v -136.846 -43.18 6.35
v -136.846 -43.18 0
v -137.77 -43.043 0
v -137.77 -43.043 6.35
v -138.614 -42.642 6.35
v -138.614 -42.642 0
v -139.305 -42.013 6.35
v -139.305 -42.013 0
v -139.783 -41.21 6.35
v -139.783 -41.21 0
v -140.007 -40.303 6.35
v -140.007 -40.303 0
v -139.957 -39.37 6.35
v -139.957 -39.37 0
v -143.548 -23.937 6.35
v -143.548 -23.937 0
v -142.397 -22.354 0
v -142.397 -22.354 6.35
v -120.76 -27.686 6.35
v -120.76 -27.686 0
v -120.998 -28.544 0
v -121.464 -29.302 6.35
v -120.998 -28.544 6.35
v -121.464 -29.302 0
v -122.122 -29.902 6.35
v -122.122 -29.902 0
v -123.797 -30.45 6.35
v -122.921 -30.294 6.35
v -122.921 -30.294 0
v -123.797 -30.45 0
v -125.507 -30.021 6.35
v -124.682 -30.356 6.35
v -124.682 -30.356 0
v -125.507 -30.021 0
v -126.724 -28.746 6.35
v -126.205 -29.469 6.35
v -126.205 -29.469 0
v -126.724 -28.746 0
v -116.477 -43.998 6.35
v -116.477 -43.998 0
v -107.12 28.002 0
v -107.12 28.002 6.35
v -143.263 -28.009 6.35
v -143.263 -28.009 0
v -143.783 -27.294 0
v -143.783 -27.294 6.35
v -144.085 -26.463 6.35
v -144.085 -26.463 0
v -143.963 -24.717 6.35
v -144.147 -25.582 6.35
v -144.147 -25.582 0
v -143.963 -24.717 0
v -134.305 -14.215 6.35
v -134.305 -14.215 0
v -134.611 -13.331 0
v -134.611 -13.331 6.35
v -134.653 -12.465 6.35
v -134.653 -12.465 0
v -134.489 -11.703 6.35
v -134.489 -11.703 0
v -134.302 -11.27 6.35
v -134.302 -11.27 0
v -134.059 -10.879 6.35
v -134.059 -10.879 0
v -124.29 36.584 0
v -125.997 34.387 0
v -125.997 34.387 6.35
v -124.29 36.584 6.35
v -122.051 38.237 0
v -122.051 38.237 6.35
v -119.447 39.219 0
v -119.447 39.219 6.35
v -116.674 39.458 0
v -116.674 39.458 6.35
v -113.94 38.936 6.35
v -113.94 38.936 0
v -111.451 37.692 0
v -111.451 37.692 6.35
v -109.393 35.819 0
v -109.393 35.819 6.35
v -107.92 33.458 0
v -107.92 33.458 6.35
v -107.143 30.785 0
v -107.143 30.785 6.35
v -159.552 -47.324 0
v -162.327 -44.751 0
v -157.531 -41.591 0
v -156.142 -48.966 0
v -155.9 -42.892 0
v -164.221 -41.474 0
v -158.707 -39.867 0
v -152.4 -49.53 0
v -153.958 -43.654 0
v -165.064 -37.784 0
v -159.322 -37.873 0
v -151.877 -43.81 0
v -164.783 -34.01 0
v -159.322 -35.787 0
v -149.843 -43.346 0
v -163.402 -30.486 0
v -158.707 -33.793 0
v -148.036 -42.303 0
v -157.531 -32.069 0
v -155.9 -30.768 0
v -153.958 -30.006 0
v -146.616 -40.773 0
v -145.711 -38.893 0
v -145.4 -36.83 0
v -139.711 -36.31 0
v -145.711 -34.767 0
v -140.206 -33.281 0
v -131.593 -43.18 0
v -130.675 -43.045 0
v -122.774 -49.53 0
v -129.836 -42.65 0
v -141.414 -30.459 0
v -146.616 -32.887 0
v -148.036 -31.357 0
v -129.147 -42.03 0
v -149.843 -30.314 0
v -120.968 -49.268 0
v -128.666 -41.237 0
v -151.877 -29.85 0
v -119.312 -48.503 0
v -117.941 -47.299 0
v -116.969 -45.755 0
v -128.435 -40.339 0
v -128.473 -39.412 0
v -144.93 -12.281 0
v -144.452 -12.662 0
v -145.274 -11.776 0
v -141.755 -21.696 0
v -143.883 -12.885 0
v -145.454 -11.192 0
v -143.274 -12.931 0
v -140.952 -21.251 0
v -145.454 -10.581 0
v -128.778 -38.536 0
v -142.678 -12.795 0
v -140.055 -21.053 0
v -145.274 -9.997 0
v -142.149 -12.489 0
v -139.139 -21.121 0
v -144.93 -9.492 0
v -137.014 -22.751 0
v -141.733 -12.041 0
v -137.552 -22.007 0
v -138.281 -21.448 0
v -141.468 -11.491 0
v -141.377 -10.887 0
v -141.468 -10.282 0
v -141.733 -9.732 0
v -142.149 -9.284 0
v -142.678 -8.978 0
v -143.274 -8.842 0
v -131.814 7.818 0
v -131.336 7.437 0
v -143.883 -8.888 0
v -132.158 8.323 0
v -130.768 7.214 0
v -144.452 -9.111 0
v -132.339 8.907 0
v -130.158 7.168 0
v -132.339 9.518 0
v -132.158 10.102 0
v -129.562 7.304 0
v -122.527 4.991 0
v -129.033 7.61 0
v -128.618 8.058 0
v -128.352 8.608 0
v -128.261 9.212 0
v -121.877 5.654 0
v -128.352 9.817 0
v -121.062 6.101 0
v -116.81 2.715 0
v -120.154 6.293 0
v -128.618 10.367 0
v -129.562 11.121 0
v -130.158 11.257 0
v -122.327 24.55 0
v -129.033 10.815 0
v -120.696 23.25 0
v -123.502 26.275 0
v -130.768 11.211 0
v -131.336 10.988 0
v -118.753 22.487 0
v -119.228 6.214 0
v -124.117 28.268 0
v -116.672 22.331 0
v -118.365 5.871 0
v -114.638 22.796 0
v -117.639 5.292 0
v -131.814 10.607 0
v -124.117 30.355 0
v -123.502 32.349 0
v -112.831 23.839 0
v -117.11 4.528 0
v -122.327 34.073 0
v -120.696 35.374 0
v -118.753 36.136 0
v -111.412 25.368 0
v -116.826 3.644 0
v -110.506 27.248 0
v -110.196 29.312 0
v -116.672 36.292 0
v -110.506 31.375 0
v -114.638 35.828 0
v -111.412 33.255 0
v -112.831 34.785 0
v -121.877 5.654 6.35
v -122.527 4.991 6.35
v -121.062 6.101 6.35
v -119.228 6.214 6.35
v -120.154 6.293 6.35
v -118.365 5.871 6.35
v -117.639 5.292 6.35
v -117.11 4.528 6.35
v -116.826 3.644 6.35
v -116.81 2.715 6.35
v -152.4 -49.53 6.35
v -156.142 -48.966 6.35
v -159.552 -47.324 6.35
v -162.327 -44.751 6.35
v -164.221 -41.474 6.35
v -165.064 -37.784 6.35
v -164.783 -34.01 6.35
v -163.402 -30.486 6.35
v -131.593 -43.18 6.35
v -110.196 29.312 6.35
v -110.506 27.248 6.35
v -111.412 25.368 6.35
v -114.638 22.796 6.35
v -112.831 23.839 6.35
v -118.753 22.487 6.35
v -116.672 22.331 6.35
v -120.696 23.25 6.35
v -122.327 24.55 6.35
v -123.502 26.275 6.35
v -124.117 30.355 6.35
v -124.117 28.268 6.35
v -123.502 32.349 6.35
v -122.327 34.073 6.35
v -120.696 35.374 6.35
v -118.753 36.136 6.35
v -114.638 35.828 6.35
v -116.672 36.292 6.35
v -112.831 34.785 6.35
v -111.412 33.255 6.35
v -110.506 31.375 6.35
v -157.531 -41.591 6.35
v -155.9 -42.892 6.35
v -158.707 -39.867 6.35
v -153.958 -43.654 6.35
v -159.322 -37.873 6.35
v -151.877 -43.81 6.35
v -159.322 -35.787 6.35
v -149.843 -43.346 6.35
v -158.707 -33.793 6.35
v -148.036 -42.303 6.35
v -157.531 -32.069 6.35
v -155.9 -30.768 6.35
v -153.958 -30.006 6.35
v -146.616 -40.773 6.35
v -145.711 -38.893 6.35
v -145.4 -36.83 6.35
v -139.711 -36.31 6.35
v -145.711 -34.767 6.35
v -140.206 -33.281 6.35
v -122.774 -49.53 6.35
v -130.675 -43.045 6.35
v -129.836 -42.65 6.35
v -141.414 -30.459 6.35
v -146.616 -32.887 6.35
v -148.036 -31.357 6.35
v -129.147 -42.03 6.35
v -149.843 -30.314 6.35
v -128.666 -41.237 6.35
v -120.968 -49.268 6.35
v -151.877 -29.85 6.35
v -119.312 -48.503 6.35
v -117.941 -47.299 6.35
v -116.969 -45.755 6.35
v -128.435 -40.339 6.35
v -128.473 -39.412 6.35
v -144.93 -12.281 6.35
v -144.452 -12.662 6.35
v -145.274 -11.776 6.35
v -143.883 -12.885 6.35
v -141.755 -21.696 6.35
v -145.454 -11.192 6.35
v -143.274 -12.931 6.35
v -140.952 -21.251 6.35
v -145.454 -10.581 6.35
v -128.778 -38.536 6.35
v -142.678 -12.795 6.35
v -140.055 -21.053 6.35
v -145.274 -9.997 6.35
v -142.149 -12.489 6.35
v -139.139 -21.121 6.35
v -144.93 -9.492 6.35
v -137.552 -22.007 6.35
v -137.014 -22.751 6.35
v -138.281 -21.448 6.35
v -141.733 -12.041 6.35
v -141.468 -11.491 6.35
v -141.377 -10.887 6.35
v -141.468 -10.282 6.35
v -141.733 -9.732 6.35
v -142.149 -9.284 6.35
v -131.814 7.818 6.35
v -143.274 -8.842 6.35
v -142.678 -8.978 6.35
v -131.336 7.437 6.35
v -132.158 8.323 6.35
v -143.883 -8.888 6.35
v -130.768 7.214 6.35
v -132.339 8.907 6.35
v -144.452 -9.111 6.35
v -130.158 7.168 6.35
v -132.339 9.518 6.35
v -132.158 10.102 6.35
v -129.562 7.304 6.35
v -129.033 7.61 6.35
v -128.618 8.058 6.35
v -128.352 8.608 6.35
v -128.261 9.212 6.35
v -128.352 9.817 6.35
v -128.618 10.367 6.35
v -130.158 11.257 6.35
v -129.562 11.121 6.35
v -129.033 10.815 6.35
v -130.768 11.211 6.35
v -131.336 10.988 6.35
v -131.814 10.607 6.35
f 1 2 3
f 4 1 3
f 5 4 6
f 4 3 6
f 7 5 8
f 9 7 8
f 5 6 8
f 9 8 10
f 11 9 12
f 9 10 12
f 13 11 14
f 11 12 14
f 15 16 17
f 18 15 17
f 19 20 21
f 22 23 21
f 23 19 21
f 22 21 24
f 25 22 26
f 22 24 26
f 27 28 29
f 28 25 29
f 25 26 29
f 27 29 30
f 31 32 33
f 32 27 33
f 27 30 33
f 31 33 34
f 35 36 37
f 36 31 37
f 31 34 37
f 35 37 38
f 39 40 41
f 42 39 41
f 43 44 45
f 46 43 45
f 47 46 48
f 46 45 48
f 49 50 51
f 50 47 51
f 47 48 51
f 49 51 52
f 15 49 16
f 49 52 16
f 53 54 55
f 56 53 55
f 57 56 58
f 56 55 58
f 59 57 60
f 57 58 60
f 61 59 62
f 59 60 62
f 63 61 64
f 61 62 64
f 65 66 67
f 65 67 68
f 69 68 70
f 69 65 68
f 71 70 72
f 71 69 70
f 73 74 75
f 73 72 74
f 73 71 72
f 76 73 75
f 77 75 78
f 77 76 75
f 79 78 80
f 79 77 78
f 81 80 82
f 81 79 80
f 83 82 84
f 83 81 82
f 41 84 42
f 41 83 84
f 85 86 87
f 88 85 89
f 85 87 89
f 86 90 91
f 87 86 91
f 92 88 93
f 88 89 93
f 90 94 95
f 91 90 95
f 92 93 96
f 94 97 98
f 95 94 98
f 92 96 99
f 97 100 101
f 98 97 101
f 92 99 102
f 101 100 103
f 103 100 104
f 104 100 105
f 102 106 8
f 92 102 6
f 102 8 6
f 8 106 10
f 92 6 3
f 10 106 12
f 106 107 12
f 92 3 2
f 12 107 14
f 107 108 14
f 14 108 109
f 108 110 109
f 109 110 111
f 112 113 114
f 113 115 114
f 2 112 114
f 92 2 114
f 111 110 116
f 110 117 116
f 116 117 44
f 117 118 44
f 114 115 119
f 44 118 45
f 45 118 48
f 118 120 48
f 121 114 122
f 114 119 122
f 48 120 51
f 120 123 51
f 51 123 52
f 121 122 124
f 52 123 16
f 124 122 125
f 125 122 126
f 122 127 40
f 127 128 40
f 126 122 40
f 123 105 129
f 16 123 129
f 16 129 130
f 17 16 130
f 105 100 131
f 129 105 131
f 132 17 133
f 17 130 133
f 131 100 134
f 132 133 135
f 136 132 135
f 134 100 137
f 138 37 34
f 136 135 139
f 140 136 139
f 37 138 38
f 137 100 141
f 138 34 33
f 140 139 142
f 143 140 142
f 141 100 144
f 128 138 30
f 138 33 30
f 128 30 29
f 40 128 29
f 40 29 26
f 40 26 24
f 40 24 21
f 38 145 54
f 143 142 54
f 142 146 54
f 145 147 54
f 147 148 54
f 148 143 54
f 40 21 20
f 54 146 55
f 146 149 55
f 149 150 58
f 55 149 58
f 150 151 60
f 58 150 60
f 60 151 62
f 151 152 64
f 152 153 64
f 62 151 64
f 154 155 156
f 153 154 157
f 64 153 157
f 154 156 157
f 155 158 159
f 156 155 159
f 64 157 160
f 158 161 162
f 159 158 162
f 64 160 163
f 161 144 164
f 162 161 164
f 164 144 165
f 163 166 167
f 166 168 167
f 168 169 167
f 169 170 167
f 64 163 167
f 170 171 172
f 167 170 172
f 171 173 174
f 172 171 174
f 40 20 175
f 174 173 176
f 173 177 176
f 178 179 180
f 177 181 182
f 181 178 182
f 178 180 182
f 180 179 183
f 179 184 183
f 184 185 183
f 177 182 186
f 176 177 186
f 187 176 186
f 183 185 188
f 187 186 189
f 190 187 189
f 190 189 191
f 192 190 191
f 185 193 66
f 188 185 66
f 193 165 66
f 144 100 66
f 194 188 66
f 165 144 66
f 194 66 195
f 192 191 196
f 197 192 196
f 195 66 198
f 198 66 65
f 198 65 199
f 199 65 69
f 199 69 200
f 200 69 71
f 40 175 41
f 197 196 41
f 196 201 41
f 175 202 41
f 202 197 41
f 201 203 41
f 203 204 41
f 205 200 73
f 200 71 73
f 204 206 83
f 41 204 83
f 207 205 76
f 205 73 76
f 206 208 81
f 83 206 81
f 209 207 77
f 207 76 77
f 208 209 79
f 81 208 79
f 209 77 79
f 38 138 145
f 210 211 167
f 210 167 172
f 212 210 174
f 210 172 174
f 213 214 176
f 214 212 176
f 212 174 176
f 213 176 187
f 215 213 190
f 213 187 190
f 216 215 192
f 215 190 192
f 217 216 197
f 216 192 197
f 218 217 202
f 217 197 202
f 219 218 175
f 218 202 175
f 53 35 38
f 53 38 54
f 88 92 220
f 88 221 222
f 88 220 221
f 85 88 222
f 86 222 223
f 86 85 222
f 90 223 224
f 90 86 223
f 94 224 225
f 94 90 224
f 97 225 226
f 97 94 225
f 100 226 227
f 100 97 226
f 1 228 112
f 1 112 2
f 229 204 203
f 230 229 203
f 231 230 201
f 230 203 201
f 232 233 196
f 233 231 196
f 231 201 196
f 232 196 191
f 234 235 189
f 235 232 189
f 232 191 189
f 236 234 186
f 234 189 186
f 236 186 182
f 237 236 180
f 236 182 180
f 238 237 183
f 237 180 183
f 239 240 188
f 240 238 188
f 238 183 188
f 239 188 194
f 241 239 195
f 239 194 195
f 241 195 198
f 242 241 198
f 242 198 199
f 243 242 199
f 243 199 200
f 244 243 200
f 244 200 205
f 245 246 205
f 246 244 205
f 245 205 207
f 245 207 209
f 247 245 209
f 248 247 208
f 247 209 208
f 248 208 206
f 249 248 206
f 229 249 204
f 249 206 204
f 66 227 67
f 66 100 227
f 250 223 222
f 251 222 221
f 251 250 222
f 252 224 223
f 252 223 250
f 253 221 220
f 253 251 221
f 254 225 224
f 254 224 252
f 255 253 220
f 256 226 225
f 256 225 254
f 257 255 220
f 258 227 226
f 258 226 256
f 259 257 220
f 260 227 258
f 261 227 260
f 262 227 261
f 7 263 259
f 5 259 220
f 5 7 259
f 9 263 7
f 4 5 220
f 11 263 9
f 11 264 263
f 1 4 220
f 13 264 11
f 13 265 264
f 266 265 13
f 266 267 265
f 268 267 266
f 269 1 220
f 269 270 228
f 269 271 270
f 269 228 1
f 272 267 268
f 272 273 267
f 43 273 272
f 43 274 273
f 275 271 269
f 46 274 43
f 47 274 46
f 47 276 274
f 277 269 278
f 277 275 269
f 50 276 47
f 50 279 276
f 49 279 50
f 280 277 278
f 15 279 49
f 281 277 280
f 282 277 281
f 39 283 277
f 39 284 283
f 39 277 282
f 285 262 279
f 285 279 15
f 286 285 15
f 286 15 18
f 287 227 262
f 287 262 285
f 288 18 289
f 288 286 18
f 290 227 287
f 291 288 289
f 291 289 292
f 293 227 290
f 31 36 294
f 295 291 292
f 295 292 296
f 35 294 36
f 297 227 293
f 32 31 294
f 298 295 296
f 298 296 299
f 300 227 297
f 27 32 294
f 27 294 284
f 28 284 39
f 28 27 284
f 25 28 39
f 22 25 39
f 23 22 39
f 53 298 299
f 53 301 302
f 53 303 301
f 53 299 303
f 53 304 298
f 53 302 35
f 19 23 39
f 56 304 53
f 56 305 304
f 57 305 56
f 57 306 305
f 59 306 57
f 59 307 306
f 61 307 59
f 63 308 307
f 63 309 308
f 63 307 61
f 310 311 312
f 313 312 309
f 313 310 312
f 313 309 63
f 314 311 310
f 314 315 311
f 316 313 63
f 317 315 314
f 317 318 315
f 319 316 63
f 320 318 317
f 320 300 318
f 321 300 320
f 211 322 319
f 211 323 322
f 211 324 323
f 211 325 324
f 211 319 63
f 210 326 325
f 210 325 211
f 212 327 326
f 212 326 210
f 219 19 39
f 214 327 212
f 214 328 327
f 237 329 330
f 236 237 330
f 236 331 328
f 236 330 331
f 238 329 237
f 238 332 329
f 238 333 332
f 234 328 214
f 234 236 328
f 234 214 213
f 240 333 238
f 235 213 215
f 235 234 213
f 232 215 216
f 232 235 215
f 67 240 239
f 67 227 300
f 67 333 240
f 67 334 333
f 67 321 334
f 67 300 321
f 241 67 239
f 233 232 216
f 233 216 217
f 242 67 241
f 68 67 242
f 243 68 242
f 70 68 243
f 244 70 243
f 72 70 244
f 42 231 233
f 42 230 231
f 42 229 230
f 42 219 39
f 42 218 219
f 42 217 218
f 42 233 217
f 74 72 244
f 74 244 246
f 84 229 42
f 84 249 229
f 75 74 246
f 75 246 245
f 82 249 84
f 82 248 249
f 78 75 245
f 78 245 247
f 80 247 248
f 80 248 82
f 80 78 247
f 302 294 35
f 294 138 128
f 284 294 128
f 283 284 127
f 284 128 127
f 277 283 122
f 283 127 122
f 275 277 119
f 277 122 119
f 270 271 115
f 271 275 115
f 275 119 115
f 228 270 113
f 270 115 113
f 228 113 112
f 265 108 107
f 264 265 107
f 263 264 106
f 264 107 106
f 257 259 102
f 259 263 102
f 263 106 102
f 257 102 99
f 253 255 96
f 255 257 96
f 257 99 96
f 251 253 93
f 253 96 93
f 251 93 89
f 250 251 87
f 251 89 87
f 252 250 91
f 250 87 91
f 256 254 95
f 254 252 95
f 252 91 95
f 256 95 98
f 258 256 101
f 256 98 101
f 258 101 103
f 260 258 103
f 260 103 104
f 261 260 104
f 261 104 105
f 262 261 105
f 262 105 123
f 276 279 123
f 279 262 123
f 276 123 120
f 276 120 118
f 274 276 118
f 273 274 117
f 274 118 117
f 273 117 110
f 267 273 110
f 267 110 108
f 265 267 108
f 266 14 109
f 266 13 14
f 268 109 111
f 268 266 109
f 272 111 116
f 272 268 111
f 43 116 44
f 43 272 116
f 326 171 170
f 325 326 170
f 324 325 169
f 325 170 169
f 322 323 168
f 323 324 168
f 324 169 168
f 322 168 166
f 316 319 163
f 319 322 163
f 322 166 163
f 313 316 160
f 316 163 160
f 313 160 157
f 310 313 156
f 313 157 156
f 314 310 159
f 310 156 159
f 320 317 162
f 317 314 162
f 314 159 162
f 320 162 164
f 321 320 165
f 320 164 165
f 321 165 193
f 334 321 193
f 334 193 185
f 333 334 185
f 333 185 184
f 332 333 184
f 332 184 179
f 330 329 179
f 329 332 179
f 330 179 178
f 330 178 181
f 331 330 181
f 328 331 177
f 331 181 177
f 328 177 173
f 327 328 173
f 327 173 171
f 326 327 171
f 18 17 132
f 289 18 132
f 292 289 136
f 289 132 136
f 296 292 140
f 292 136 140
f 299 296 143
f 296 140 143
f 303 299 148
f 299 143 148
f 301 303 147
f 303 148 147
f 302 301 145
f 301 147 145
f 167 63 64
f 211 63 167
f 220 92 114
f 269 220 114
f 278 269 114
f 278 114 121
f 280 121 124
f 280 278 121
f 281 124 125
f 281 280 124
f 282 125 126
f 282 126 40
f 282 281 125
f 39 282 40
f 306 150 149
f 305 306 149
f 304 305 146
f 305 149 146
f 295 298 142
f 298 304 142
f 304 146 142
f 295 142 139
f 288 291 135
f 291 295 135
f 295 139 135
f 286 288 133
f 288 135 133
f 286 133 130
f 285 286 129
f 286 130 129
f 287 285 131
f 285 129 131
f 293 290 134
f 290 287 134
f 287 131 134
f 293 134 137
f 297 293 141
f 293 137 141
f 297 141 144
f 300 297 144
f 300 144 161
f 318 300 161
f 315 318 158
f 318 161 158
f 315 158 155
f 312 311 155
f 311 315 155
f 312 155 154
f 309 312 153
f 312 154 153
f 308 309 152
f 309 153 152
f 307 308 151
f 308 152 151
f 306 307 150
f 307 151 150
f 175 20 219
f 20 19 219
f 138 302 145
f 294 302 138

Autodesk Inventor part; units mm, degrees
ref_plane "YZ Plane" through (0, 0, 0) normal (1, 0, 0) x (0, 1, 0)
ref_plane "XZ Plane" through (0, 0, 0) normal (0, 1, 0) x (-1, 0, 0)
ref_plane "XY Plane" through (0, 0, 0) normal (0, 0, 1) x (1, 0, 0)
sketch "Sketch1" plane through (0, 0, 0) normal (0, 0, 1) x (1, 0, 0)
  circle A0 centre (0, 0) radius 7
  line L0 (0, 0) -> (0, -11.43) construction
  line L1 (0, -11.43) -> (-50.8, -11.43) construction
  circle A1 centre (-50.8, -11.43) radius 7
  line L2 (0, -11.43) -> (0, -24.13) construction
  line L3 (-50.8, -11.43) -> (-50.8, -24.13) construction
  line L4 (0, -24.13) -> (-101.6, -24.13) construction
  line L5 (-101.6, -24.13) -> (-101.6, -125.73) construction
  line L6 (0, -24.13) -> (12.7, -24.13) construction
  line L7 (-101.6, -125.73) -> (-35.3, -24.13) construction
  line L8 (-101.6, -125.73) -> (15.6852, -125.73) construction
  line L9 (-35.3, -24.13) -> (-117.1955, 29.3117) construction
  line L10 (-117.1955, 29.3117) -> (-143.4272, -10.8866) construction
  line L11 (-123.0577, 33.1371) -> (-149.2895, -7.0611) construction
  line L12 (-137.565, -14.712) -> (-111.3333, 25.4862) construction
  arc A2 (-111.3333, 25.4862) -> (-123.0577, 33.1371) centre (-117.1955, 29.3117) ccw construction
  arc A3 (-149.2895, -7.0611) -> (-137.565, -14.712) centre (-143.4272, -10.8866) ccw construction
  circle A4 centre (-117.1955, 29.3117) radius 12.7 construction
  circle A5 centre (0, 0) radius 120.8055 construction
  circle A6 centre (-50.8, -11.43) radius 92.6288 construction
  line L13 (-101.6, -125.73) -> (-152.4, -125.73) construction
  line L14 (-152.4, -125.73) -> (-152.4, -87.63) construction
  circle A7 centre (-152.4, -87.63) radius 38.1
  line L15 (-152.4, -87.63) -> (-152.4, -49.53) construction
  line L16 (-152.4, -49.53) -> (-152.4, -36.83) construction
  circle A8 centre (-152.4, -36.83) radius 12.7 construction
  circle A9 centre (-117.1955, 29.3117) radius 10.16
  circle A10 centre (-152.4, -36.83) radius 12.7
  line L17 (-163.4022, -30.4863) -> (-125.9972, 34.3866)
  line L18 (-152.4, -49.53) -> (-117.1955, -49.53)
  circle A11 centre (-130.3114, 9.2125) radius 2.05
  circle A12 centre (-143.4272, -10.8866) radius 2.05
  circle A13 centre (-117.1955, 29.3117) radius 7
  circle A14 centre (-152.4, -36.83) radius 7
  line L19 (-117.1955, -49.53) -> (-107.1202, 28.0024)
  point P0 (-152.4, -49.53)
  dimension "d0" = 14
  dimension "d1" = 11.43
  dimension "d2" = 50.8
  dimension "d3" = 14
  dimension "d4" = 12.7
  dimension "d5" = 12.7
  dimension "d6" = 101.6
  dimension "d7" = 101.6
  dimension "d8" = 12.7
  dimension "d9" = 48
  dimension "d14" = 97.79
  dimension "d15" = 90
  dimension "d16" = 48
  dimension "d17" = 14
  dimension "d18" = 25.4
  dimension "d19" = 50.8
  dimension "d20" = 38.1
  dimension "d21" = 12.7
  dimension "d22" = 20.32
  dimension "d24" = 4.1
  dimension "d25" = 4.1
  dimension "d26" = 14
extrude "Extrusion1" add sketch "Sketch1" along normal blind 6.35 contours A10 | A10 L17 A9 L19 L18 | A9
fillet "Fillet1" radius 6.35 1 edges at (-117.1955, -49.53, 3.175)
sketch "Sketch2" plane through (0, 0, 6.35) normal (0, 0, 1) x (1, 0, 0)
  circle A0 centre (-152.4, -36.83) radius 7 construction
  circle A1 centre (-152.4, -36.83) radius 12.7
  circle A2 centre (-117.1955, 29.3117) radius 7 construction
  circle A3 centre (-117.1955, 29.3117) radius 10.16
  line L0 (-125.9972, 34.3866) -> (-163.4022, -30.4863) construction
  arc A4 (-122.7737, -49.53) -> (-116.4767, -43.9983) centre (-122.7737, -43.18) ccw construction
  line L1 (-152.4, -49.53) -> (-122.7737, -49.53) construction
  line L2 (-116.4767, -43.9983) -> (-107.1202, 28.0024) construction
  line L3 (-122.7737, -43.18) -> (-114.631, 19.4806)
  line L4 (-122.7737, -43.18) -> (-149.4542, -43.18)
  circle A5 centre (-143.4272, -10.8866) radius 2.05 projected
  line L5 (-143.4272, -10.8866) -> (-130.3114, 7.1625) construction
  circle A6 centre (-130.3114, 9.2125) radius 2.05 projected
  line L6 (-145.2764, -26.316) -> (-115.2046, 15.0667)
  line L7 (-136.4387, 11.6152) -> (-149.5546, -6.434)
  arc A7 (-149.5546, -6.434) -> (-137.2998, -15.3392) centre (-143.4272, -10.8866) ccw
  arc A8 (-124.184, 2.7099) -> (-136.4387, 11.6152) centre (-130.3114, 7.1625) ccw
  line L8 (-122.7737, -43.18) -> (-137.2998, -15.3392) construction
  line L9 (-119.9588, -41.7113) -> (-134.485, -13.8705)
  line L10 (-140.1147, -16.8079) -> (-125.5886, -44.6487)
  arc A9 (-125.5886, -44.6487) -> (-119.9588, -41.7113) centre (-122.7737, -43.18) ccw
  arc A10 (-134.485, -13.8705) -> (-140.1147, -16.8079) centre (-137.2998, -15.3392) ccw
  point P0 (0, 0)
  point P1 (-136.8693, -1.862)
  point P2 (-130.0368, -29.2596)
  point P3 (-135.4334, -12.7707)
  point P4 (-122.0596, -37.6849)
  point P5 (-126.3549, -43.18)
  point P6 (-139.3843, -18.2077)
  point P7 (-141.4015, -43.18)
  dimension "d30" = 6.35
extrude "Extrusion2" cut sketch "Sketch2" against normal through all contours A1 L6 L10 L4 | L6 L3 L9 A10
fillet "Fillet2" radius 3.175 7 edges at (-115.2046, 15.0667, 3.175) (-122.0596, -37.6849, 3.175) (-135.4334, -12.7707, 3.175) (-139.3843, -18.2077, 3.175) (-126.3549, -43.18, 3.175) (-141.4015, -43.18, 3.175) (-145.2764, -26.316, 3.175)
properties part number "Intake_FourBar_Plate"
